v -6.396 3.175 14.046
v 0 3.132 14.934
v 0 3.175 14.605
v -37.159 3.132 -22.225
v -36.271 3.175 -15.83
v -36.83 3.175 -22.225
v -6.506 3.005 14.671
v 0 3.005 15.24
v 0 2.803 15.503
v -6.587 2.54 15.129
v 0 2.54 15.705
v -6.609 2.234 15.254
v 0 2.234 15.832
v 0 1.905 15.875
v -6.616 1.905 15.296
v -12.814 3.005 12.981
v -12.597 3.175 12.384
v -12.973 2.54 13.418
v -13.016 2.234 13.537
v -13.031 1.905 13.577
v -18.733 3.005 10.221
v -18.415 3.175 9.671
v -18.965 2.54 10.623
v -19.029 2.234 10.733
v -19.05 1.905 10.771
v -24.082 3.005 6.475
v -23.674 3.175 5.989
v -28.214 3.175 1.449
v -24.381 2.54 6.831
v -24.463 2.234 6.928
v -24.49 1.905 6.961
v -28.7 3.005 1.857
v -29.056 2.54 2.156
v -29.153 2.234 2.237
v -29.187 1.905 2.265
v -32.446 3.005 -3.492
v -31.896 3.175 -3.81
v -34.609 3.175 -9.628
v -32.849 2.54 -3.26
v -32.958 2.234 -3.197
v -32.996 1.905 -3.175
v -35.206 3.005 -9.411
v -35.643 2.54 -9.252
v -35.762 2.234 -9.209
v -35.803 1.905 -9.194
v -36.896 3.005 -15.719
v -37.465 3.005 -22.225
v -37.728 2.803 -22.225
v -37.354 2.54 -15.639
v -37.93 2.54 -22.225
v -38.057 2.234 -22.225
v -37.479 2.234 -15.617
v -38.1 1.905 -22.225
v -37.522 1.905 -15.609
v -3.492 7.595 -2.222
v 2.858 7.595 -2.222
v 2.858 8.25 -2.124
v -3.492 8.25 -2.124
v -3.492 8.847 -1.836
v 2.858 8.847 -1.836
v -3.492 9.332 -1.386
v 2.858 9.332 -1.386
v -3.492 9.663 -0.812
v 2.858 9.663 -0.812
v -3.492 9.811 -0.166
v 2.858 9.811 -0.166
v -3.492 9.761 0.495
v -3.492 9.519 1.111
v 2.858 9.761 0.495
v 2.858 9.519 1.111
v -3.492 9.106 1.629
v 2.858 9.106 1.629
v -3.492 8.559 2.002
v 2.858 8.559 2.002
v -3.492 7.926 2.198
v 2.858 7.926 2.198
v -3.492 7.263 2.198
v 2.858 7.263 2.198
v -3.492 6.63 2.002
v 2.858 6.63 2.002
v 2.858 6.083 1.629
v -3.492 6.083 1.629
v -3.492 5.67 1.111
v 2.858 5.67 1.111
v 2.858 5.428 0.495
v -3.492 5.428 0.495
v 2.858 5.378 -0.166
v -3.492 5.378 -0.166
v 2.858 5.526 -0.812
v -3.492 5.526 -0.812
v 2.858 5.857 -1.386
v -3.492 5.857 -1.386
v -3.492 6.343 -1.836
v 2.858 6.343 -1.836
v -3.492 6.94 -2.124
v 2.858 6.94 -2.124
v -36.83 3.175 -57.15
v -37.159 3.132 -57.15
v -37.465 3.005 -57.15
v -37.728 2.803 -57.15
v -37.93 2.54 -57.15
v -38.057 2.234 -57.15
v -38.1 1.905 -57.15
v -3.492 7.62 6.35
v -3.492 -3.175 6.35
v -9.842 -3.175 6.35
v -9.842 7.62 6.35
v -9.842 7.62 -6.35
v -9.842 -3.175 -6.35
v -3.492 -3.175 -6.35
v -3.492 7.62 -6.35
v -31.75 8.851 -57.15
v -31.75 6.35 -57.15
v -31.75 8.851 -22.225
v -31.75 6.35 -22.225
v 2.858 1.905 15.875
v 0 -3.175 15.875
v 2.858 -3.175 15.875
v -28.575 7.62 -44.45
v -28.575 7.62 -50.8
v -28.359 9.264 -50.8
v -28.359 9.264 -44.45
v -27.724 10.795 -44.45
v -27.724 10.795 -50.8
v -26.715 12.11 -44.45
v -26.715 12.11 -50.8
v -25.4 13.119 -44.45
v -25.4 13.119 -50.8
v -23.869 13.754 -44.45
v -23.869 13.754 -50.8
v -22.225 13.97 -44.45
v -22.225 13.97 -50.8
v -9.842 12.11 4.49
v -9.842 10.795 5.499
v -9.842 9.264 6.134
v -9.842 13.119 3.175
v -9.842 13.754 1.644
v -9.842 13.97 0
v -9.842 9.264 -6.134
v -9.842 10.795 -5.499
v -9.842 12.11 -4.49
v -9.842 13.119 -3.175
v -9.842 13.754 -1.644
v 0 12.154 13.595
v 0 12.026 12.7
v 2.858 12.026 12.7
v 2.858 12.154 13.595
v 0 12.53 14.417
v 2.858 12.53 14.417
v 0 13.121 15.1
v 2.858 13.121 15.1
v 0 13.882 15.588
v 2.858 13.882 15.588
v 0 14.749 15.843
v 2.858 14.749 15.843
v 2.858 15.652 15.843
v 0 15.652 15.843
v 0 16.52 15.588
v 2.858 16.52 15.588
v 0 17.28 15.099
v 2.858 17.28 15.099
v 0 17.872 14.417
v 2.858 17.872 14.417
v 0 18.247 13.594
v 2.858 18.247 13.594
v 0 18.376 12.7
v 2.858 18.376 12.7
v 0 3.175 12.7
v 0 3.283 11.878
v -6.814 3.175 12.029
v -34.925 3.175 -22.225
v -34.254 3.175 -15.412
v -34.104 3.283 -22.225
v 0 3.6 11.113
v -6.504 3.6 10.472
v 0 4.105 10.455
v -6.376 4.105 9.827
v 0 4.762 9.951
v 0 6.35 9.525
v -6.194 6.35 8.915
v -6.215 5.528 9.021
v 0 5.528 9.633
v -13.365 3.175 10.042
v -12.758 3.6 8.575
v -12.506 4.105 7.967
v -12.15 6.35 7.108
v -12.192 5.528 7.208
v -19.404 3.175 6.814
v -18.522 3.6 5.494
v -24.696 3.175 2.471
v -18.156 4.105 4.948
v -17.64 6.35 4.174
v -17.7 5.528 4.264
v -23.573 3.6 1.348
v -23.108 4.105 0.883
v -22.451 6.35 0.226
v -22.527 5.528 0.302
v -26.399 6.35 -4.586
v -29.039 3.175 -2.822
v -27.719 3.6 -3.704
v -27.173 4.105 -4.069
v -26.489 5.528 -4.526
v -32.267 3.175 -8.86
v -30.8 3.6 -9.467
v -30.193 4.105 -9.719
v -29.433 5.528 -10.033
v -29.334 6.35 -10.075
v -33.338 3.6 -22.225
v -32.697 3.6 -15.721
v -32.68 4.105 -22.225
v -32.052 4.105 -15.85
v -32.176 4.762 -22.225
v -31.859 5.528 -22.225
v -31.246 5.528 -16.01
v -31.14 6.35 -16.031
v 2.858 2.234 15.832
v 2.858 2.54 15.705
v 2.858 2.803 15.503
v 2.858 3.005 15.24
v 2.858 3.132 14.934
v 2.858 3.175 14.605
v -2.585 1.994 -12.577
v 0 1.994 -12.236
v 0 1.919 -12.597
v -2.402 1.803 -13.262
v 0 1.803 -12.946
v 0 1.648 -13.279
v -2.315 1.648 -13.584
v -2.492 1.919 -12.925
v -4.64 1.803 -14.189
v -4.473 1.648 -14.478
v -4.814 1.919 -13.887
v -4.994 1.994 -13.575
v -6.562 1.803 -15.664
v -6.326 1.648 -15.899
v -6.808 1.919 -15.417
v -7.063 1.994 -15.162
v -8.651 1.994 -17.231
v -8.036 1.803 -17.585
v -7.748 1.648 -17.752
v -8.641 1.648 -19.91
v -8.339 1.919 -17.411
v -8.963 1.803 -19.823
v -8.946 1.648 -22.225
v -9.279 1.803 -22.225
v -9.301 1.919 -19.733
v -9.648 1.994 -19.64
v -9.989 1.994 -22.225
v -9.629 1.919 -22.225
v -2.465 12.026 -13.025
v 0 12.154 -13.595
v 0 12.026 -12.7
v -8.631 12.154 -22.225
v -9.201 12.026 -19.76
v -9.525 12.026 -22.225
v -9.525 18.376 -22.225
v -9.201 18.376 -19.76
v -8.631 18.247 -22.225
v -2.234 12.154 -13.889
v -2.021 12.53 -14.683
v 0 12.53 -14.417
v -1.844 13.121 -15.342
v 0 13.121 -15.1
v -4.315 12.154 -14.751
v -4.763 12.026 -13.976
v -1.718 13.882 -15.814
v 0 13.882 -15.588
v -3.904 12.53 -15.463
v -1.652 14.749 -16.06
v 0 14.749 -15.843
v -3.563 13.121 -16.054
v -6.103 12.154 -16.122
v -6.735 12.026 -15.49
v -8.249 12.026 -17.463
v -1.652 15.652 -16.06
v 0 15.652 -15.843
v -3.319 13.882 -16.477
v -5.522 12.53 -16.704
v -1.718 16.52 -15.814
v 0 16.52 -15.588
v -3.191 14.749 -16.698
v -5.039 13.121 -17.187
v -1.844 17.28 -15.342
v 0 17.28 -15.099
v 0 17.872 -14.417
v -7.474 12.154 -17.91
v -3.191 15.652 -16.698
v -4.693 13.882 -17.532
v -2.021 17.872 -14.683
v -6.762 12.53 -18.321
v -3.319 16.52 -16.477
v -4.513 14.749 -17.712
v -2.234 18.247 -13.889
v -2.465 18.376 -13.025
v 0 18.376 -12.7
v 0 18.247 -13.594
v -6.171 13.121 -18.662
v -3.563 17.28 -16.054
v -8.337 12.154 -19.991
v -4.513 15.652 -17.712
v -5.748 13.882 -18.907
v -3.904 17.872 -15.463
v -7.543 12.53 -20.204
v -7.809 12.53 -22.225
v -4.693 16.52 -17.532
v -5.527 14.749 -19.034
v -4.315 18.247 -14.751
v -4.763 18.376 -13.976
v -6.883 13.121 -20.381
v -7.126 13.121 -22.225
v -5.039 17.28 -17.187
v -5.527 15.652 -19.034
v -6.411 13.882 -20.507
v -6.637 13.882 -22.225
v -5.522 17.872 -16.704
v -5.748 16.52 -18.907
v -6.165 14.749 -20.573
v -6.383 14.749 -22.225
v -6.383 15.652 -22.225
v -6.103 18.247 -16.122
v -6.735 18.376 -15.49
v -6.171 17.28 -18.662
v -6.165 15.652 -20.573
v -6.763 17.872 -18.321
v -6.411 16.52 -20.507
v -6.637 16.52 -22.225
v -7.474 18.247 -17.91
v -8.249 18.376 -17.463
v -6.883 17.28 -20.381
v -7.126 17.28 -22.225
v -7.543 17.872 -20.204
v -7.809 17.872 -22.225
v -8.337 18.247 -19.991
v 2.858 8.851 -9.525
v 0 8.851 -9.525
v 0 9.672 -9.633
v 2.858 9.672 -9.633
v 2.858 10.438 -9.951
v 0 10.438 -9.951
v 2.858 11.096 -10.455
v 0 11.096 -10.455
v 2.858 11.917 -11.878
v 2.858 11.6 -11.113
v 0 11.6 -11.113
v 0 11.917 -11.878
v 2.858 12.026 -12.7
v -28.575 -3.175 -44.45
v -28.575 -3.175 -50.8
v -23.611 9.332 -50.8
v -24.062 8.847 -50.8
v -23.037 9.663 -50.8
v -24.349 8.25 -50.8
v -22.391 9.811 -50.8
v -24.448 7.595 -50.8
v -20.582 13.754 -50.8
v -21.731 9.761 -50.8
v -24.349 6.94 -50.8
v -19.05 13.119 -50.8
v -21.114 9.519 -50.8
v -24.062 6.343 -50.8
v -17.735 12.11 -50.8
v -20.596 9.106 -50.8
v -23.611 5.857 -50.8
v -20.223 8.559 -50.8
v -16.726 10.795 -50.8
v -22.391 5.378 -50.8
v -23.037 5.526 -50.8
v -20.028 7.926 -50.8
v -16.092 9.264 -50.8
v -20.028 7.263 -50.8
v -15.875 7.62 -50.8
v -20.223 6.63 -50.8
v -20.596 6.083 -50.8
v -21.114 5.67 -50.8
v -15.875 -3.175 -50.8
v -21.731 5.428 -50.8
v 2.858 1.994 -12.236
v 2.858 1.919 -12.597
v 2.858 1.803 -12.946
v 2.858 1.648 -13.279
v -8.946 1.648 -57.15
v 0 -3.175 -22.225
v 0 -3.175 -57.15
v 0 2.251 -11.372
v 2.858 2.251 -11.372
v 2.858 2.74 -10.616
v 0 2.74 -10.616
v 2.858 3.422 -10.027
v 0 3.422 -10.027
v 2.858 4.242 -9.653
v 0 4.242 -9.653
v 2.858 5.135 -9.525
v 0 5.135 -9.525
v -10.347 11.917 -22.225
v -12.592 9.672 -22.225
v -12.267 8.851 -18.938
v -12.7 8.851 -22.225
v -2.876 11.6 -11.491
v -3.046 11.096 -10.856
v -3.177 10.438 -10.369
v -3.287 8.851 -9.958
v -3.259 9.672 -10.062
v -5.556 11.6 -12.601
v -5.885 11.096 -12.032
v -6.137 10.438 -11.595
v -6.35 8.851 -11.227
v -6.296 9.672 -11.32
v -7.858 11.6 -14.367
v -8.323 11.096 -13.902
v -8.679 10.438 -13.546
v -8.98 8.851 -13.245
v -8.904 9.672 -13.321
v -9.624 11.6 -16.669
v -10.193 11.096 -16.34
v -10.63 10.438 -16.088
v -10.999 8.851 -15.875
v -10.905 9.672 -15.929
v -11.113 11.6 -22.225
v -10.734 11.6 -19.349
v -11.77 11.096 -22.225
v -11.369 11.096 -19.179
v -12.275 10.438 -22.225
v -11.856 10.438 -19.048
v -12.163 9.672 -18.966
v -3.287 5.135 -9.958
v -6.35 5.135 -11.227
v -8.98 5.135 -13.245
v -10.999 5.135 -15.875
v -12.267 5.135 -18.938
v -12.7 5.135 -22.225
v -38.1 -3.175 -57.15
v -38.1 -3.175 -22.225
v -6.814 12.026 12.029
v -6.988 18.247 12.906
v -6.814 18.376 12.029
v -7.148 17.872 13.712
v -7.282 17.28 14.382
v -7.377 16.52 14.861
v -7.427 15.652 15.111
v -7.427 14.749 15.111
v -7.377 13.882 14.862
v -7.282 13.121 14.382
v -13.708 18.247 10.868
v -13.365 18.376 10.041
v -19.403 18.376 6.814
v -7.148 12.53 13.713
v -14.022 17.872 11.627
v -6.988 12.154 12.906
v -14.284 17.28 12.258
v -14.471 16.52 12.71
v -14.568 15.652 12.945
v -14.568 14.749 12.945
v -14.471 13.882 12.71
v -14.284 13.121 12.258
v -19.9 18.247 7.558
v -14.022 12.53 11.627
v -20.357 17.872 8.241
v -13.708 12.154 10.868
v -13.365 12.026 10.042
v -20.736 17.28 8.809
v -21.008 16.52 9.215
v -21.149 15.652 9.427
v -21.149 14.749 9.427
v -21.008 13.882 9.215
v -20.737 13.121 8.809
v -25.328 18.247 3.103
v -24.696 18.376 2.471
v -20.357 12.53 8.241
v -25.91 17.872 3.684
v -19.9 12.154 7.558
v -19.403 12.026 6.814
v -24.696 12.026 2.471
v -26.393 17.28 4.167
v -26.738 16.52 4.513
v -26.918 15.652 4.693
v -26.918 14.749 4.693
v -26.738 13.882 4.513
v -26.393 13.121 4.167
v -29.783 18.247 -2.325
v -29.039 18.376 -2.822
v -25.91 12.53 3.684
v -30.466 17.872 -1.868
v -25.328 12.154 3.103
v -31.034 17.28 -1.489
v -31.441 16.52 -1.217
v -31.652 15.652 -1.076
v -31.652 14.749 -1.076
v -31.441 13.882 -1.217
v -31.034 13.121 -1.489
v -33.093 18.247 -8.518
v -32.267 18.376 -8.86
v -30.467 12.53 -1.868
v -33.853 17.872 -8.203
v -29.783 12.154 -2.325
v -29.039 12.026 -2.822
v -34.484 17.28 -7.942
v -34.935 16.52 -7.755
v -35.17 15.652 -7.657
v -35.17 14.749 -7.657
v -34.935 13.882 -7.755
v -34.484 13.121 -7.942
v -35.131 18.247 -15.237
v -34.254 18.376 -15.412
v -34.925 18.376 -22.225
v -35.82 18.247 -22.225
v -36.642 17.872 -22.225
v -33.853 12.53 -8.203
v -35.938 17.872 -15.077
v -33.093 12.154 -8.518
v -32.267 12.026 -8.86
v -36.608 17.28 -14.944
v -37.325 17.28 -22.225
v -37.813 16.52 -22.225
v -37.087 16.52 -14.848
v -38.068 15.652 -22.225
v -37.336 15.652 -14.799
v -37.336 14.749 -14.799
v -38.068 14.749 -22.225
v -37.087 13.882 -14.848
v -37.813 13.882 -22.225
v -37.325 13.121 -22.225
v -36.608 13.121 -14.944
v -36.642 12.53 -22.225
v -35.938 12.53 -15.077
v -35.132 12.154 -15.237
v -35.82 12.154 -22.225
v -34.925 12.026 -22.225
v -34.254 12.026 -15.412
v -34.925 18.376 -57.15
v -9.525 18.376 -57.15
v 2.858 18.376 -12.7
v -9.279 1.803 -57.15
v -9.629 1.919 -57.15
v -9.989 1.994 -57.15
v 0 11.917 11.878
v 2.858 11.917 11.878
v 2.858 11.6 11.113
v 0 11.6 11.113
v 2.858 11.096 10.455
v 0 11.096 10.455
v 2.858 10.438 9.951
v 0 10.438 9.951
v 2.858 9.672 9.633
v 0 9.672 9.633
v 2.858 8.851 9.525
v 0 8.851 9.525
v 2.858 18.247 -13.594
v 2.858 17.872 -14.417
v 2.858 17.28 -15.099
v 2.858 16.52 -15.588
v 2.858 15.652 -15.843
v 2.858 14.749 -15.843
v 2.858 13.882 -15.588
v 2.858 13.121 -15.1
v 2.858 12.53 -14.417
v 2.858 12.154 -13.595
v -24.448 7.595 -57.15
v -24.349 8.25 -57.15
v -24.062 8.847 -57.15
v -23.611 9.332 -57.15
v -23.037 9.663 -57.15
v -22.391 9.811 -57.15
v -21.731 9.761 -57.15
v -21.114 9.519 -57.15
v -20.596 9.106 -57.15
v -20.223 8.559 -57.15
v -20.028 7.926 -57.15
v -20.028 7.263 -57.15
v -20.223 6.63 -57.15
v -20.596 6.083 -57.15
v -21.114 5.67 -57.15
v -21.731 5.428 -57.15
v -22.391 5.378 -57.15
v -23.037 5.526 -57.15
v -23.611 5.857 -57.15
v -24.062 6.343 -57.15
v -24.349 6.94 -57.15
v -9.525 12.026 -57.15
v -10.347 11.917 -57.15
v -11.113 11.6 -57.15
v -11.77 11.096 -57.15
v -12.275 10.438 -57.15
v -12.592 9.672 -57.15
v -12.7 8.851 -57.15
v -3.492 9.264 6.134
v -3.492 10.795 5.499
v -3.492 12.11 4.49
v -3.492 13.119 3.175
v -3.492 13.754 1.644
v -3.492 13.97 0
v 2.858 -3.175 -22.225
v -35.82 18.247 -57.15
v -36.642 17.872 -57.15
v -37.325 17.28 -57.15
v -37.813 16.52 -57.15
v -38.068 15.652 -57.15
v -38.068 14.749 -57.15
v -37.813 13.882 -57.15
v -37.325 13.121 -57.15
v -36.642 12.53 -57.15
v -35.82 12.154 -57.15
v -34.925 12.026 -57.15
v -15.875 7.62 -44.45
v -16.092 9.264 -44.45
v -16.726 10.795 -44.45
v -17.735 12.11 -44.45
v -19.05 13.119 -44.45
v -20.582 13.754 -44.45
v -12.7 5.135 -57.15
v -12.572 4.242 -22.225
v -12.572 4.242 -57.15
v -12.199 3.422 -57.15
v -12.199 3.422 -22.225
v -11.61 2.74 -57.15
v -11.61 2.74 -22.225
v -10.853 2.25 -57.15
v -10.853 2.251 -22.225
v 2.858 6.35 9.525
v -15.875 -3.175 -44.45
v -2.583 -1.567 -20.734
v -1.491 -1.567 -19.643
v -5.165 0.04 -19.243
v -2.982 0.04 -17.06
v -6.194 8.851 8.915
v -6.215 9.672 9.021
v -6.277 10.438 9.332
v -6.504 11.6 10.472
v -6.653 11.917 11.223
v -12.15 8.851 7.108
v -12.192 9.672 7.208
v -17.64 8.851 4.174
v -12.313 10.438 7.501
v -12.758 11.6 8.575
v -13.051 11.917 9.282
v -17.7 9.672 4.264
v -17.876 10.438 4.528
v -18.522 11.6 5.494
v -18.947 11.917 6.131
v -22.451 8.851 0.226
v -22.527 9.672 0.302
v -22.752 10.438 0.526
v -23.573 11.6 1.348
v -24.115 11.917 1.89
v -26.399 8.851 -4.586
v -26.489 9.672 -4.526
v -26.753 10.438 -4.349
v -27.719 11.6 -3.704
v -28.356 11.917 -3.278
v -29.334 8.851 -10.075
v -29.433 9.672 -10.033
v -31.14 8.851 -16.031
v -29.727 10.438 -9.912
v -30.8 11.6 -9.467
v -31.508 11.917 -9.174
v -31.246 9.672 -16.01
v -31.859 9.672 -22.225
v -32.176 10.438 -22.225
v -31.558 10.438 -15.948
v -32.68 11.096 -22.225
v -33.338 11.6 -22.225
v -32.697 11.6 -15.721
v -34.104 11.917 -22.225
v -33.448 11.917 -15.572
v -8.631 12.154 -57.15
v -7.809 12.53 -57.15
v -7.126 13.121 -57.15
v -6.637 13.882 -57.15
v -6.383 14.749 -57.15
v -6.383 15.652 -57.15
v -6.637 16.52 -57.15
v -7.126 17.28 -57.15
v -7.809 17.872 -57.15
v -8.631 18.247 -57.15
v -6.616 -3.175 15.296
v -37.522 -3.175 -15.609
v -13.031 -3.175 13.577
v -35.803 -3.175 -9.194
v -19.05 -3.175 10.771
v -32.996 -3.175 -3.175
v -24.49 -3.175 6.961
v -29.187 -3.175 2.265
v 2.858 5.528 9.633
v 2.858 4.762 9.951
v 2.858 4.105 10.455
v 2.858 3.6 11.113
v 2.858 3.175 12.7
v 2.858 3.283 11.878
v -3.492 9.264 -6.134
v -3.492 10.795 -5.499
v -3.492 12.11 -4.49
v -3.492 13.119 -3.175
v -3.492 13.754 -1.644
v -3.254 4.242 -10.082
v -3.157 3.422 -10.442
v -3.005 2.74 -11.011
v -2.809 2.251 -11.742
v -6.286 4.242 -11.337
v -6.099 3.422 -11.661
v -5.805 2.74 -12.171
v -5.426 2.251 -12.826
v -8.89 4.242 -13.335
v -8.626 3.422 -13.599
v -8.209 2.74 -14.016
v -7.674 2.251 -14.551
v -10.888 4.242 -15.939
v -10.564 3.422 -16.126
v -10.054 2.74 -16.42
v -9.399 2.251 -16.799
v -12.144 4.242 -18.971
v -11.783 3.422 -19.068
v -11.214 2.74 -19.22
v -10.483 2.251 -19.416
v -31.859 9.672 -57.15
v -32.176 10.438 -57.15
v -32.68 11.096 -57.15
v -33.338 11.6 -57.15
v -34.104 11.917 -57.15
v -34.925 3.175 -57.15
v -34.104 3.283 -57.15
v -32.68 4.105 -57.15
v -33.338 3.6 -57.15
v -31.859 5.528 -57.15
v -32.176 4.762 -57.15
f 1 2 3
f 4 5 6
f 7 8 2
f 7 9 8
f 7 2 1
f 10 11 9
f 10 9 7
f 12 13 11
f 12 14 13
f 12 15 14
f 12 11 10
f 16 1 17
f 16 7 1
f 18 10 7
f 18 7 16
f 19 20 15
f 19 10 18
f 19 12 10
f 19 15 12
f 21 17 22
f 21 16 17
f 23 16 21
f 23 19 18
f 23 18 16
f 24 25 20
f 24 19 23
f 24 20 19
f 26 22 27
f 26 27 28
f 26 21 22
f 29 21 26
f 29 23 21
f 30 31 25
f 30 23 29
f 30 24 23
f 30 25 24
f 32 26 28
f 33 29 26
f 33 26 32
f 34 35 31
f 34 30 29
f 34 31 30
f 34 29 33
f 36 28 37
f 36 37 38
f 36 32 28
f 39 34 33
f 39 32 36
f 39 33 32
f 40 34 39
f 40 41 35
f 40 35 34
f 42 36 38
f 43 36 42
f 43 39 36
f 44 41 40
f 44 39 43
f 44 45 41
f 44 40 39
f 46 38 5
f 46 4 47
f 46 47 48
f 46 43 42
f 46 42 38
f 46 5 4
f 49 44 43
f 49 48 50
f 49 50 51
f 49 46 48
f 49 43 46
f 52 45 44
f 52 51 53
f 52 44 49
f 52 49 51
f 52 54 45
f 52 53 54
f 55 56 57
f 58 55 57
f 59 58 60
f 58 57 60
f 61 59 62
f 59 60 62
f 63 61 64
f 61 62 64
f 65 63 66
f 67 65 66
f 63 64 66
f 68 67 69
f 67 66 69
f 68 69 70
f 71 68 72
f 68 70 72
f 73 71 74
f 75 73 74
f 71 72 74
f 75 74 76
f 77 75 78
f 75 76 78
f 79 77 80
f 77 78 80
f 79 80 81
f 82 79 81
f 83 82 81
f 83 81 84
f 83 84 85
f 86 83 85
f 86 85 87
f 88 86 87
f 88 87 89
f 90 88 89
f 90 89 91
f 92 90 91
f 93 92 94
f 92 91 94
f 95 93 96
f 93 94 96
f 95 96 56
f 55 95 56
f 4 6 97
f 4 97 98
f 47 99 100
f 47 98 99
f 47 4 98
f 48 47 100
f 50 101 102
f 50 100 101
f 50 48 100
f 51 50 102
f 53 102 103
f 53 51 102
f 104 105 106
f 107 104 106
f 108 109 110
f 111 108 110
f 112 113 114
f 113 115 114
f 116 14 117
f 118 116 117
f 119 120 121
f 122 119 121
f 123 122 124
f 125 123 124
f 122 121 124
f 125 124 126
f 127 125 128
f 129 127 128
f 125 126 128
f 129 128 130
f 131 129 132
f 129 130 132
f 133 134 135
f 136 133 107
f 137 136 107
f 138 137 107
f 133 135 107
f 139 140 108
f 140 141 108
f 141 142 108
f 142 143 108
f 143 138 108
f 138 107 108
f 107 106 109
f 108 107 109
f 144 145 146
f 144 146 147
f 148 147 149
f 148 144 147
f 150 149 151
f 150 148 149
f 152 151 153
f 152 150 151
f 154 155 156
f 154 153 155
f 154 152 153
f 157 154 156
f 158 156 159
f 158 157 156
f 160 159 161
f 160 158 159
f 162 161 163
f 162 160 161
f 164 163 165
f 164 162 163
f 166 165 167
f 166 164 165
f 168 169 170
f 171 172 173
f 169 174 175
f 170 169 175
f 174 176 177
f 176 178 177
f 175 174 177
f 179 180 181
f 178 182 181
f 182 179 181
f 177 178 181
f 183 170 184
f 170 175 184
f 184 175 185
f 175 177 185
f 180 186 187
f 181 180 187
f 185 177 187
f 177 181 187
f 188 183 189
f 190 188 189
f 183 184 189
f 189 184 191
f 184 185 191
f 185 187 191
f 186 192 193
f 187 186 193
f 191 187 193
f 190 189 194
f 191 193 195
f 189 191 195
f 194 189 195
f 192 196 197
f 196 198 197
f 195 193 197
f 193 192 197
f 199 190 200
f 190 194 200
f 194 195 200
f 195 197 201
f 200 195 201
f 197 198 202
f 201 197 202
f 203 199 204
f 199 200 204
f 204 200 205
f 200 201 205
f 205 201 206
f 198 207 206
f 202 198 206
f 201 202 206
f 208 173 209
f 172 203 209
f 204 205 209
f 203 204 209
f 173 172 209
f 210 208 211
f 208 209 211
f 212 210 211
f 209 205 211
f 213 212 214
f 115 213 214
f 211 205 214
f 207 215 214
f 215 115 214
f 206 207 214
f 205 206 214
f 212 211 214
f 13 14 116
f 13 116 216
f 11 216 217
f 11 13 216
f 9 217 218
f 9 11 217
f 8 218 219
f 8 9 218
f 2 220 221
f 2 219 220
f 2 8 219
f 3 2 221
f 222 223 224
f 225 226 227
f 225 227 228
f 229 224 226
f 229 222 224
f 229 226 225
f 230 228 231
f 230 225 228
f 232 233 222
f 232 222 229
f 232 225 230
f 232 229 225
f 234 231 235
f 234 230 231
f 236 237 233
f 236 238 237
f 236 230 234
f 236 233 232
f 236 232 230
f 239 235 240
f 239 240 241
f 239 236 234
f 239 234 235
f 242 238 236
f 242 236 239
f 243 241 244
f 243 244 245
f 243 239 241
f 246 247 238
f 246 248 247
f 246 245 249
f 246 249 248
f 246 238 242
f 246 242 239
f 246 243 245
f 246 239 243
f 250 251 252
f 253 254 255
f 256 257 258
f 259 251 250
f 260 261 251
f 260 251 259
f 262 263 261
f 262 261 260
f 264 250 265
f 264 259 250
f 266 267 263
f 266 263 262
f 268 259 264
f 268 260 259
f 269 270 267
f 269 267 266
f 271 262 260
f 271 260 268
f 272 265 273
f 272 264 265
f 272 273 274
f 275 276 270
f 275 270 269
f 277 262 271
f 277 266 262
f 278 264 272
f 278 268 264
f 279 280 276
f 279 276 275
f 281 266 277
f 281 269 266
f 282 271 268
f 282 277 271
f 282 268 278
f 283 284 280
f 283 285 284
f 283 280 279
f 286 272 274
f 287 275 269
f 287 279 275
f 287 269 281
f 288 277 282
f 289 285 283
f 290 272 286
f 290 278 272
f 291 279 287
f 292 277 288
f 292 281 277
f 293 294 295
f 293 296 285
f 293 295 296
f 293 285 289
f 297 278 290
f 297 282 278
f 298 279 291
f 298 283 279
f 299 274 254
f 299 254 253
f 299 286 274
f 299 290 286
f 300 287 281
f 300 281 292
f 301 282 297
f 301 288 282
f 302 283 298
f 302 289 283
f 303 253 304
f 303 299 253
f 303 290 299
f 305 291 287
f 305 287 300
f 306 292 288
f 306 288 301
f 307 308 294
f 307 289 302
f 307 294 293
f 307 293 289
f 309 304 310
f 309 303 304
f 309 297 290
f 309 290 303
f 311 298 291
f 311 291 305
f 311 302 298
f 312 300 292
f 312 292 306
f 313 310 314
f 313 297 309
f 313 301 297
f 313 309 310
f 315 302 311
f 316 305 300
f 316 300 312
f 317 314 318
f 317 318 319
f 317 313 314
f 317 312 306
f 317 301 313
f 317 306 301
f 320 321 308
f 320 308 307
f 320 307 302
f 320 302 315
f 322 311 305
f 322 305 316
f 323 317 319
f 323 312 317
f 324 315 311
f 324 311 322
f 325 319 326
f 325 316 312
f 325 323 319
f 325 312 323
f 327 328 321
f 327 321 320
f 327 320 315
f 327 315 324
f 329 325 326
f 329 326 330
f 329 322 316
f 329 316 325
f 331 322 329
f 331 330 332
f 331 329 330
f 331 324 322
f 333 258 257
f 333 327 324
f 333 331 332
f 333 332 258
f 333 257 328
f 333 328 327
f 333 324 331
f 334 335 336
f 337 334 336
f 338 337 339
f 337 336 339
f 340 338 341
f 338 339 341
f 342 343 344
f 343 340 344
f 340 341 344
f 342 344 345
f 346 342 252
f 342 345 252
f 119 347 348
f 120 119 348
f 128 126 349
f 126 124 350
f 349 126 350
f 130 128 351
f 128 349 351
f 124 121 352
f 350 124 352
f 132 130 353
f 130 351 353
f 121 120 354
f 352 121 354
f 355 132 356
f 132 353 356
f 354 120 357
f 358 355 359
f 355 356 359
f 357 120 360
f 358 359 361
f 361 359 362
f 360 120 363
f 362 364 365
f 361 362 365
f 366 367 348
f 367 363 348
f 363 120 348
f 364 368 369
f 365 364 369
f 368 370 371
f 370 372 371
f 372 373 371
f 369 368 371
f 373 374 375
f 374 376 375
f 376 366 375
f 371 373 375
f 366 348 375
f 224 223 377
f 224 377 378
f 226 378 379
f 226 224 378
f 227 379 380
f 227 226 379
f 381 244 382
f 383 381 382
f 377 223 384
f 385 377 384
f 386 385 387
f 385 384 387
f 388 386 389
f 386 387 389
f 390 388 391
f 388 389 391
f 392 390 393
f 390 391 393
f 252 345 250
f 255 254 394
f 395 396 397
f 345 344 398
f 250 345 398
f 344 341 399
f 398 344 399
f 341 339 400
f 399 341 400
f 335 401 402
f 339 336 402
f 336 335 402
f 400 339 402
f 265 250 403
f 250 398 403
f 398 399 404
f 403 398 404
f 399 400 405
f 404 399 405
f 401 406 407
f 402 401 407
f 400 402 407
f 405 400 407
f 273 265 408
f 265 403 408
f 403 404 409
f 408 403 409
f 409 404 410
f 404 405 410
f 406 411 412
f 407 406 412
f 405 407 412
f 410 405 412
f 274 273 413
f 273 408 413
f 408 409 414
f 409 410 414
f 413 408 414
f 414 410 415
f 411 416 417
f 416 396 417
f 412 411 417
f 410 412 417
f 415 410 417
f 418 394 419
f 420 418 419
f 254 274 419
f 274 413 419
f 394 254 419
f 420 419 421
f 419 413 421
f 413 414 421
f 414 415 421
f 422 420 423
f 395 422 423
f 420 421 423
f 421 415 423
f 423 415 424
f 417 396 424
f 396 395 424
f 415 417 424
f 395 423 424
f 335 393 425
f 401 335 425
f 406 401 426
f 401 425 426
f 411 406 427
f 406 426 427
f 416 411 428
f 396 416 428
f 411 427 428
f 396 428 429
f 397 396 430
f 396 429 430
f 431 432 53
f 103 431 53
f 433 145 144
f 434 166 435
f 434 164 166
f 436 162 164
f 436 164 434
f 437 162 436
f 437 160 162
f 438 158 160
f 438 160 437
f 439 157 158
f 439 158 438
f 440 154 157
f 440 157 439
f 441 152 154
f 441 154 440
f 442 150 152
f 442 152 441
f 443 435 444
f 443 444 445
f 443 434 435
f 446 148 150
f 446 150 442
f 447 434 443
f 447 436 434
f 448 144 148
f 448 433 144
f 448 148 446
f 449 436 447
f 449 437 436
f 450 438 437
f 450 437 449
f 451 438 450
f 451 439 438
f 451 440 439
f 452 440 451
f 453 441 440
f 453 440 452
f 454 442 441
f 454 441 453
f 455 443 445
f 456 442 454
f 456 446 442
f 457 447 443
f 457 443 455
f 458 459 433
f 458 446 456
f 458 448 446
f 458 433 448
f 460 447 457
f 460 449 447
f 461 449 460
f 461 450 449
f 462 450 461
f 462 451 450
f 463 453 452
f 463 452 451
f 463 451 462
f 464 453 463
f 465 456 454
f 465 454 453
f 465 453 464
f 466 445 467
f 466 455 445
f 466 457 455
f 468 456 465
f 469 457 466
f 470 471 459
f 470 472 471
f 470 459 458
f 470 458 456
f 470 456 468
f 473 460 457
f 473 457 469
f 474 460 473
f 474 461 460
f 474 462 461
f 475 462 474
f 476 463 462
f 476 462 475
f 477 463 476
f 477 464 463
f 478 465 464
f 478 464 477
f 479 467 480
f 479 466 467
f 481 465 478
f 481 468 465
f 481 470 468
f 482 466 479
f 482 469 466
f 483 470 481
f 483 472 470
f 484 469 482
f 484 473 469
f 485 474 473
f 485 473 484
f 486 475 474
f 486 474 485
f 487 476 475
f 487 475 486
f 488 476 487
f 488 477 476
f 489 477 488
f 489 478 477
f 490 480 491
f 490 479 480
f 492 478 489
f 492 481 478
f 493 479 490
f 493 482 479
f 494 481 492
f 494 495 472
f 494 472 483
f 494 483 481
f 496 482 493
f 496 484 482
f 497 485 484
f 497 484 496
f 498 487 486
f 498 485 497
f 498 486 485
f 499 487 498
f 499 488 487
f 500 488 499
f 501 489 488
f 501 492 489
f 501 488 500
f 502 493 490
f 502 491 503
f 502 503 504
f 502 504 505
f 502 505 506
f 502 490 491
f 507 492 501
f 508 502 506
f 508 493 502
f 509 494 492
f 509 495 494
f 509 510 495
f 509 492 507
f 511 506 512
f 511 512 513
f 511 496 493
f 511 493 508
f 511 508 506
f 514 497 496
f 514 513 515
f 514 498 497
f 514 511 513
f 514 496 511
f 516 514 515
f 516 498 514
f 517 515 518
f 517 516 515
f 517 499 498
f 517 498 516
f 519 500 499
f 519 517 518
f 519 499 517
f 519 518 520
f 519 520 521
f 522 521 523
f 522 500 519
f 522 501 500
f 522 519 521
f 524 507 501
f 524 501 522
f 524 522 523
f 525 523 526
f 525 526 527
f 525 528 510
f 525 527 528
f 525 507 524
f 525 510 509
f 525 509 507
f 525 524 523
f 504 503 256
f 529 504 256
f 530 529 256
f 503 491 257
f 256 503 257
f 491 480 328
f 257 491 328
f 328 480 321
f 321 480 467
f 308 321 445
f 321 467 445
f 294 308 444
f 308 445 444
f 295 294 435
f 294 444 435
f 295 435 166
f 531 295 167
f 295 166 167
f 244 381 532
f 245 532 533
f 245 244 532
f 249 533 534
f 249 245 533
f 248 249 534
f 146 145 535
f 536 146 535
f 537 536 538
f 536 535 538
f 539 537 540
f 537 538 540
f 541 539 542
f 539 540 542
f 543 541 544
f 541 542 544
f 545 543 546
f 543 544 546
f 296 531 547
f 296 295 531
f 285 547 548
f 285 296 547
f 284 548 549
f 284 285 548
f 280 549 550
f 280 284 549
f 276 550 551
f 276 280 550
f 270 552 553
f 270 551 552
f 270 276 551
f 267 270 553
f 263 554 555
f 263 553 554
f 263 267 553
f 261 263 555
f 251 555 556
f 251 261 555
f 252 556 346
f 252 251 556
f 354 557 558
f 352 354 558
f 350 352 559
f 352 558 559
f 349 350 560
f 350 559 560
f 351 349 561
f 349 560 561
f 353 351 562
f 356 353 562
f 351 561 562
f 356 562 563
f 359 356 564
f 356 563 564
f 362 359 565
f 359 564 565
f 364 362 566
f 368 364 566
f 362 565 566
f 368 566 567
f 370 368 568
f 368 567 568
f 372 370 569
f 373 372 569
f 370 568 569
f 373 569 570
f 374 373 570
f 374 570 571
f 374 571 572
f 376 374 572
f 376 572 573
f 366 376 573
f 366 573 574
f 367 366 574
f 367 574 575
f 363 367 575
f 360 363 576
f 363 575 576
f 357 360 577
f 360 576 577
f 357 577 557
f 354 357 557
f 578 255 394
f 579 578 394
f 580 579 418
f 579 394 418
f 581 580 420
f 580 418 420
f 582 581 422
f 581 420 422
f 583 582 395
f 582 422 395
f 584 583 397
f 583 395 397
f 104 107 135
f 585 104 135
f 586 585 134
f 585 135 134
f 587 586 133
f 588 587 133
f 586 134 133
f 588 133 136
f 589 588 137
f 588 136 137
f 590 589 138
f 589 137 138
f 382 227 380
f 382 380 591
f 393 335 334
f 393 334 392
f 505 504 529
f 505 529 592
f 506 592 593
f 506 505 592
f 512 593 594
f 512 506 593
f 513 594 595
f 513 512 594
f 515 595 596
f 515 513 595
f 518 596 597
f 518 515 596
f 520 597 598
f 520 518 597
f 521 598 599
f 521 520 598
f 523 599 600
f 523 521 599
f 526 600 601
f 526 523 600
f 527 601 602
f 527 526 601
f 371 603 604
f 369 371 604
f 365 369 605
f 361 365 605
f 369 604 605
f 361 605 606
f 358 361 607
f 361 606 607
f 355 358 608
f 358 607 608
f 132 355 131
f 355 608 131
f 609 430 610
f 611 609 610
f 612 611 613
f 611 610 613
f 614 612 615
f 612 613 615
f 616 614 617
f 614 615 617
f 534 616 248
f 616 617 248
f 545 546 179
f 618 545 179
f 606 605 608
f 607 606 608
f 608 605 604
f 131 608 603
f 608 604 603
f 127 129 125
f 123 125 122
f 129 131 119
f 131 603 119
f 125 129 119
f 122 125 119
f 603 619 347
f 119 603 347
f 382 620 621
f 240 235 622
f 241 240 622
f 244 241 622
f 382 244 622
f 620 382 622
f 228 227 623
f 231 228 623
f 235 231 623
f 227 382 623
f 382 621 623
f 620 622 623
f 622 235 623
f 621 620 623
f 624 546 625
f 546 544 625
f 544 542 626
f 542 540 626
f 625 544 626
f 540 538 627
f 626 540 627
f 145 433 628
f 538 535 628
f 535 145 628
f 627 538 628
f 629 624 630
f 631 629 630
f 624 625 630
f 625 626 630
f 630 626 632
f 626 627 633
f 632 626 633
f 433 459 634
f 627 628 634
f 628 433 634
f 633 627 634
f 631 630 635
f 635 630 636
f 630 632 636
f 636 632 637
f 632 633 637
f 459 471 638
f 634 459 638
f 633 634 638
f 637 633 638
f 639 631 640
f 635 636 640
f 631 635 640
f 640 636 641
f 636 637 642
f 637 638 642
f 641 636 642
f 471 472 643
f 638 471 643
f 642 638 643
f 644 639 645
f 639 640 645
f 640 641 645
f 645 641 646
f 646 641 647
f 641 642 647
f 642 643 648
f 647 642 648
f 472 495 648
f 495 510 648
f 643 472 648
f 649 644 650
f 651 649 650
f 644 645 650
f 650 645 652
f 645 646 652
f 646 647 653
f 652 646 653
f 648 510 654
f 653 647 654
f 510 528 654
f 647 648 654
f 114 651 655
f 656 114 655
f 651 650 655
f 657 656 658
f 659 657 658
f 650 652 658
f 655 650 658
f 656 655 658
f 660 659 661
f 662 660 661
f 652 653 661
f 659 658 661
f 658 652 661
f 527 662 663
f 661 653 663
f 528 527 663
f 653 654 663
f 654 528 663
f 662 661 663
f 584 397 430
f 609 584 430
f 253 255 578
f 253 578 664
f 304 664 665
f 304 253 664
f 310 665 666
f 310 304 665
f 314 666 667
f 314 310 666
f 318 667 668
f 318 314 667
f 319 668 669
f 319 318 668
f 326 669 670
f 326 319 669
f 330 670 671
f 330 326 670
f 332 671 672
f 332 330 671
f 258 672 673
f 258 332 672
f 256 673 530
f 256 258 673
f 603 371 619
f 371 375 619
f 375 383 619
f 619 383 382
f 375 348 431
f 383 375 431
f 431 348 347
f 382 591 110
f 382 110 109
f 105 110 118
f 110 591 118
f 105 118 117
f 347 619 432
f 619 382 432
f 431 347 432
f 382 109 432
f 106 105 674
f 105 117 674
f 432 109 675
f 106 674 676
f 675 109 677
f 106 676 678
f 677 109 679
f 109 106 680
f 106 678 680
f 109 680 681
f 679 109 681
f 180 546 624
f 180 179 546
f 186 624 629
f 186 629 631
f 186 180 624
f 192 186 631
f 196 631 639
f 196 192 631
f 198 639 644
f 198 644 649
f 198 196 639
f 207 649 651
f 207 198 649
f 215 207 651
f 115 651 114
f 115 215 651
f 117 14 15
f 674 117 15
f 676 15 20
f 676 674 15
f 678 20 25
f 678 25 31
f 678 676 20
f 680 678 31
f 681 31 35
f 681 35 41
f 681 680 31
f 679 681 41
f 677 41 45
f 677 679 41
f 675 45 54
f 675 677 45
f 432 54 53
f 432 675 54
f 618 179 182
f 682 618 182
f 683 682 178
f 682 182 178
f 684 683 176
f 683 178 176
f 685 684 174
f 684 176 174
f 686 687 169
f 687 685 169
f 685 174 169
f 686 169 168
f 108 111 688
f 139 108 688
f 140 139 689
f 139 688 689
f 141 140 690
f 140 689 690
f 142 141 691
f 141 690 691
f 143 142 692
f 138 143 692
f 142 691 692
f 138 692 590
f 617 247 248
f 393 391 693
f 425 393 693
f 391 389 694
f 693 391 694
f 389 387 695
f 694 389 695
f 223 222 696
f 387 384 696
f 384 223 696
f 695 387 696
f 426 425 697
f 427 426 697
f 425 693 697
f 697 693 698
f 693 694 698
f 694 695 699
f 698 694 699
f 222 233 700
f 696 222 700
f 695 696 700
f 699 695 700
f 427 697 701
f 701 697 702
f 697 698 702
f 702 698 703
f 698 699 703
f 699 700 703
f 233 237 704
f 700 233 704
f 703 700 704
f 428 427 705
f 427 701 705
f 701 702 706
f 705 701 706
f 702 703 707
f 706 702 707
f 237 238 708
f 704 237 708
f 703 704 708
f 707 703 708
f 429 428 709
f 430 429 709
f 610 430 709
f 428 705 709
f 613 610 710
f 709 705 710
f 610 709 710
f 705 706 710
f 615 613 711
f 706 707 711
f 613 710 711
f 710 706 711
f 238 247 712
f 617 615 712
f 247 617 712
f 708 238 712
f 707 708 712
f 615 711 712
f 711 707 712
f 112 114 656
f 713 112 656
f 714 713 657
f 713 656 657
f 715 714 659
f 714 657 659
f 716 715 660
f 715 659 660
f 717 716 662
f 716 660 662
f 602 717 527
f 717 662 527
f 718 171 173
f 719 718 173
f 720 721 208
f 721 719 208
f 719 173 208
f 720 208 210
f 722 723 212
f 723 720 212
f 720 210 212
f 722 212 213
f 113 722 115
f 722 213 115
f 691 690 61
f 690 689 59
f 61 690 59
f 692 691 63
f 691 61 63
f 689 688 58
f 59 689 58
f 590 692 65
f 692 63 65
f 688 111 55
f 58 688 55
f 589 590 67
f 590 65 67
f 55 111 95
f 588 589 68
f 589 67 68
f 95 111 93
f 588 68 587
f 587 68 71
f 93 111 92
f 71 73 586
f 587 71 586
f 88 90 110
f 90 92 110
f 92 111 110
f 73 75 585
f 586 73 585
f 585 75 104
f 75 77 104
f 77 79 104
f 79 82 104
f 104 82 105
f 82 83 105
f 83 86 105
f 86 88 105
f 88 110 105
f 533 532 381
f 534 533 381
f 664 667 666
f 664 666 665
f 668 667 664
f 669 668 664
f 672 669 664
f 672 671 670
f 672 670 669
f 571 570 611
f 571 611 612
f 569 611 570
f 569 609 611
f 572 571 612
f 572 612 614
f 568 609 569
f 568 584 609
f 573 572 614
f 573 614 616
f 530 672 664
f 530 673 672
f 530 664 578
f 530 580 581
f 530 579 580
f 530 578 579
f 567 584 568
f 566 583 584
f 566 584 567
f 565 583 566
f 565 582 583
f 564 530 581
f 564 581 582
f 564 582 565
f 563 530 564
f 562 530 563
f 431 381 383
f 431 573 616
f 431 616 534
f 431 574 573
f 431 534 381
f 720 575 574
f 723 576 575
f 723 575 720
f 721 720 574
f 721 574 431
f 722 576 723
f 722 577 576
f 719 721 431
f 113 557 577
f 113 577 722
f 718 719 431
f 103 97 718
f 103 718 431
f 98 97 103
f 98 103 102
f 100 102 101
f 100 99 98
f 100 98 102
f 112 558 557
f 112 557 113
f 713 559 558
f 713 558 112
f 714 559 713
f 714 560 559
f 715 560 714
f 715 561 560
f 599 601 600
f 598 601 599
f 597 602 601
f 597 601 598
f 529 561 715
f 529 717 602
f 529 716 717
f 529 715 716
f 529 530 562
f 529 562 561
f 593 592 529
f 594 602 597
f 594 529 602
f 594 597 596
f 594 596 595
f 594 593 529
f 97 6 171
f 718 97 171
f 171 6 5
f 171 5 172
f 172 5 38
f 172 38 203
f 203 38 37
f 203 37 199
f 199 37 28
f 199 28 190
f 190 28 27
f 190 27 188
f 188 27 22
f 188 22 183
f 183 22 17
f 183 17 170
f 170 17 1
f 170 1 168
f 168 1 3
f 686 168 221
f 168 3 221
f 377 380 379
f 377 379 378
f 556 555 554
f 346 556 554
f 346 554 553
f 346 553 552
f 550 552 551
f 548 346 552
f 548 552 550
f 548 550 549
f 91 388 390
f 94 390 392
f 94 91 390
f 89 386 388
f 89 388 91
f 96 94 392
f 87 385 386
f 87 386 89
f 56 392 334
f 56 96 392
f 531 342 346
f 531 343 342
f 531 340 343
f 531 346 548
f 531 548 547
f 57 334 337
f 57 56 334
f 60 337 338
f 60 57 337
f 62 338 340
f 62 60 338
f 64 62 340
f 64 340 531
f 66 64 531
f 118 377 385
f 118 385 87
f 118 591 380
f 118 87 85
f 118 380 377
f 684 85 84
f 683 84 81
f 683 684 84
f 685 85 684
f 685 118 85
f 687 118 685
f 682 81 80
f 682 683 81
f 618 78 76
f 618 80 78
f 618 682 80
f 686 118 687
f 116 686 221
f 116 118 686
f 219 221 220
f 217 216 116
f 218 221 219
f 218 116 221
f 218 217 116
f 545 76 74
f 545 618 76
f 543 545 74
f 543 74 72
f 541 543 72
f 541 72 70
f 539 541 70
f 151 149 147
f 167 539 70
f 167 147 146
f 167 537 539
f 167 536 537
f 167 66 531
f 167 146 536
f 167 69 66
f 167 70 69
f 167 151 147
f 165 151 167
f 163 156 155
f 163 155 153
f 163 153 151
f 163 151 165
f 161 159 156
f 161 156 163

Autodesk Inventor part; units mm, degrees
ref_plane "YZ Plane" through (0, 0, 0) normal (1, 0, 0) x (0, 1, 0)
ref_plane "XZ Plane" through (0, 0, 0) normal (0, 1, 0) x (-1, 0, 0)
ref_plane "XY Plane" through (0, 0, 0) normal (0, 0, 1) x (1, 0, 0)
sketch "Sketch1" plane through (0, 0, 0) normal (1, 0, 0) x (0, 1, 0)
  line L0 (-3.175, -15.8752) -> (-3.175, 15.8752)
  line L1 (-3.175, 15.8752) -> (1.9596, -9.7981) construction
  line L2 (3.175, 15.8752) -> (-3.175, -15.8752) construction
  arc A0 (18.3756, 12.7) -> (12.0256, 12.7001) centre (15.2006, 12.7) ccw
  arc A1 (12.0256, -12.7001) -> (18.3756, -12.7) centre (15.2006, -12.7) ccw
  line L3 (8.8506, 9.5252) -> (6.35, 9.5252)
  line L4 (8.8506, -9.5252) -> (5.1346, -9.5252)
  line L5 (15.2006, 12.7) -> (15.2006, -12.7) construction
  line L6 (3.175, 14.6052) -> (3.175, 12.7002)
  arc A2 (8.8506, 9.5252) -> (12.0256, 12.7001) centre (8.8506, 12.7002) ccw
  arc A3 (12.0256, -12.7001) -> (8.8506, -9.5252) centre (8.8506, -12.7002) ccw
  arc A4 (3.175, 12.7002) -> (6.35, 9.5252) centre (6.35, 12.7002) ccw
  arc A5 (5.1346, -9.5252) -> (1.9937, -12.2364) centre (5.1346, -12.7002) ccw
  line L7 (-3.175, -15.8752) -> (-3.175, -22.2252)
  line L8 (1.905, 15.8752) -> (-3.175, 15.8752)
  arc A6 (3.175, 14.6052) -> (1.905, 15.8752) centre (1.905, 14.6052) ccw
  line L9 (18.3756, 12.7) -> (18.3756, -12.7)
  line L10 (1.6475, -13.2791) -> (-3.175, -22.2252)
  arc A7 (1.6475, -13.2791) -> (1.9937, -12.2364) centre (-1.1473, -11.7726) ccw
  line L11 (-3.175, -22.2252) -> (20.4919, -22.2252)
  point P0 (0, 0)
  point P1 (15.2367, 9.5252)
  point P2 (15.2367, -9.5252)
  point P3 (1.9596, -12.7002)
  dimension "d5" = 6.35
  dimension "d8" = 3.175
  dimension "d9" = 6.35
  dimension "d11" = 6.35
  dimension "d12" = 6.35
  dimension "d13" = 1.27
  dimension "d30" = 25.4
  dimension "d31" = 3.175
revolve "Revolution1" add sketch "Sketch1" angle 90 about axis through (0, -3.175, -22.2252) along (0, -1, 0)
extrude "Extrusion2" add sketch "Sketch1" along normal blind 2.8575
sketch "Sketch2" plane through (-9.5252, 18.3756, -22.2252) normal (0, 0, -1) x (-1, 0, 0)
  line L0 (-9.5252, -21.5506) -> (28.5752, -21.5506) projected
  line L1 (28.5752, -21.5506) -> (28.5752, -16.4706) projected
  arc A0 (28.5752, -16.4706) -> (27.3052, -15.2006) centre (27.3052, -16.4706) ccw projected
  line L2 (27.3052, -15.2006) -> (25.4002, -15.2006) projected
  arc A1 (22.2252, -12.0256) -> (25.4002, -15.2006) centre (25.4002, -12.0256) ccw projected
  line L3 (22.2252, -12.0256) -> (22.2252, -9.525) projected
  arc A2 (25.4001, -6.35) -> (22.2252, -9.525) centre (25.4002, -9.525) ccw projected
  arc A3 (25.4001, -6.35) -> (25.4, 0) centre (25.4, -3.175) ccw projected
  line L4 (25.4, 0) -> (0, 0) projected
  arc A4 (0, 0) -> (-0.0001, -6.35) centre (0, -3.175) ccw projected
  arc A5 (3.1748, -9.525) -> (-0.0001, -6.35) centre (-0.0002, -9.525) ccw projected
  line L5 (3.1748, -9.525) -> (3.1748, -13.241) projected
  arc A6 (0.4636, -16.382) -> (3.1748, -13.241) centre (-0.0002, -13.241) ccw projected
  arc A7 (0.4636, -16.382) -> (-0.5791, -16.7281) centre (0.9274, -19.5229) ccw projected
  line L6 (-0.5791, -16.7281) -> (-9.5252, -21.5506) projected
  point P0 (-9.5252, -18.3756)
extrude "Extrusion3" add sketch "Sketch2" along normal blind 34.925
sketch "Sketch5" plane through (2.8575, 0, 0) normal (1, 0, 0) x (0, 0, -1)
  circle A0 centre (0, 7.5946) radius 2.2225
  line L0 (-15.8752, -3.175) -> (22.2252, -3.175) projected
  point P0 (0, 0)
  dimension "d26" = 4.445
  dimension "d27" = 10.7696
extrude "Extrusion4" cut sketch "Sketch5" against normal blind 12.7
sketch "Sketch6" plane through (-9.5252, 18.3756, -57.1502) normal (0, 0, -1) x (-1, 0, 0)
  line L0 (3.1748, -9.525) -> (3.1748, -13.241) projected
  line L1 (3.1748, -10.781) -> (22.2252, -10.781) construction
  line L2 (22.2252, -12.0256) -> (22.2252, -9.525) projected
  circle A0 centre (12.7, -10.781) radius 2.2225
  line L3 (-9.5252, -21.5506) -> (28.5752, -21.5506) projected
  point P0 (-9.5252, -18.3756)
  dimension "d32" = 4.445
  dimension "d33" = 10.7696
extrude "Extrusion5" cut sketch "Sketch6" against normal blind 12.7
sketch "Sketch7" plane through (0, -3.175, 15.8752) normal (0, -1, 0) x (1, 0, 0)
  line L0 (-9.8425, -13.6527) -> (-9.8425, -18.0977) projected
  line L1 (2.8575, -13.6527) -> (2.8575, -18.0977) projected
  line L2 (-20.0027, -60.3254) -> (-24.4477, -60.3254) projected
  line L3 (-20.0027, -73.0254) -> (-24.4477, -73.0254) projected
  line L4 (2.8575, 0) -> (2.8575, -38.1004) projected
  line L5 (2.8575, -15.8752) -> (-3.4925, -15.8752) construction
  line L6 (-9.8425, -22.2252) -> (-3.4925, -22.2252)
  line L7 (-3.4925, -22.2252) -> (-3.4925, -9.5252)
  line L8 (-3.4925, -9.5252) -> (-9.8425, -9.5252)
  line L9 (-9.8425, -9.5252) -> (-9.8425, -22.2252)
  line L10 (-9.8425, -22.2252) -> (-3.4925, -9.5252) construction
  line L11 (-3.4925, -22.2252) -> (-9.8425, -9.5252) construction
  line L12 (0, -73.0254) -> (-38.1004, -73.0254) projected
  line L13 (-22.2252, -73.0254) -> (-22.2252, -66.6754) construction
  line L14 (-15.8752, -60.3254) -> (-28.5752, -60.3254)
  line L15 (-28.5752, -60.3254) -> (-28.5752, -66.6754)
  line L16 (-28.5752, -66.6754) -> (-15.8752, -66.6754)
  line L17 (-15.8752, -66.6754) -> (-15.8752, -60.3254)
  line L18 (-15.8752, -60.3254) -> (-28.5752, -66.6754) construction
  line L19 (-28.5752, -60.3254) -> (-15.8752, -66.6754) construction
  point P0 (0, -15.8752)
  point P1 (-6.6675, -15.8752)
  point P2 (-22.2252, -63.5004)
  dimension "d41" = 6.35
  dimension "d42" = 6.35
  dimension "d43" = 12.7
  dimension "d44" = 6.35
extrude "Extrusion6" cut sketch "Sketch7" against normal blind 17.145
fillet "Fillet1" radius 6.35 4 edges at (-6.6675, 13.97, 6.35) (-6.6675, 13.97, -6.35) (-28.5752, 13.97, -47.6252) (-15.8752, 13.97, -47.6252)
properties part number "Rail Corner 2" material "Acetal Resin, Black"
